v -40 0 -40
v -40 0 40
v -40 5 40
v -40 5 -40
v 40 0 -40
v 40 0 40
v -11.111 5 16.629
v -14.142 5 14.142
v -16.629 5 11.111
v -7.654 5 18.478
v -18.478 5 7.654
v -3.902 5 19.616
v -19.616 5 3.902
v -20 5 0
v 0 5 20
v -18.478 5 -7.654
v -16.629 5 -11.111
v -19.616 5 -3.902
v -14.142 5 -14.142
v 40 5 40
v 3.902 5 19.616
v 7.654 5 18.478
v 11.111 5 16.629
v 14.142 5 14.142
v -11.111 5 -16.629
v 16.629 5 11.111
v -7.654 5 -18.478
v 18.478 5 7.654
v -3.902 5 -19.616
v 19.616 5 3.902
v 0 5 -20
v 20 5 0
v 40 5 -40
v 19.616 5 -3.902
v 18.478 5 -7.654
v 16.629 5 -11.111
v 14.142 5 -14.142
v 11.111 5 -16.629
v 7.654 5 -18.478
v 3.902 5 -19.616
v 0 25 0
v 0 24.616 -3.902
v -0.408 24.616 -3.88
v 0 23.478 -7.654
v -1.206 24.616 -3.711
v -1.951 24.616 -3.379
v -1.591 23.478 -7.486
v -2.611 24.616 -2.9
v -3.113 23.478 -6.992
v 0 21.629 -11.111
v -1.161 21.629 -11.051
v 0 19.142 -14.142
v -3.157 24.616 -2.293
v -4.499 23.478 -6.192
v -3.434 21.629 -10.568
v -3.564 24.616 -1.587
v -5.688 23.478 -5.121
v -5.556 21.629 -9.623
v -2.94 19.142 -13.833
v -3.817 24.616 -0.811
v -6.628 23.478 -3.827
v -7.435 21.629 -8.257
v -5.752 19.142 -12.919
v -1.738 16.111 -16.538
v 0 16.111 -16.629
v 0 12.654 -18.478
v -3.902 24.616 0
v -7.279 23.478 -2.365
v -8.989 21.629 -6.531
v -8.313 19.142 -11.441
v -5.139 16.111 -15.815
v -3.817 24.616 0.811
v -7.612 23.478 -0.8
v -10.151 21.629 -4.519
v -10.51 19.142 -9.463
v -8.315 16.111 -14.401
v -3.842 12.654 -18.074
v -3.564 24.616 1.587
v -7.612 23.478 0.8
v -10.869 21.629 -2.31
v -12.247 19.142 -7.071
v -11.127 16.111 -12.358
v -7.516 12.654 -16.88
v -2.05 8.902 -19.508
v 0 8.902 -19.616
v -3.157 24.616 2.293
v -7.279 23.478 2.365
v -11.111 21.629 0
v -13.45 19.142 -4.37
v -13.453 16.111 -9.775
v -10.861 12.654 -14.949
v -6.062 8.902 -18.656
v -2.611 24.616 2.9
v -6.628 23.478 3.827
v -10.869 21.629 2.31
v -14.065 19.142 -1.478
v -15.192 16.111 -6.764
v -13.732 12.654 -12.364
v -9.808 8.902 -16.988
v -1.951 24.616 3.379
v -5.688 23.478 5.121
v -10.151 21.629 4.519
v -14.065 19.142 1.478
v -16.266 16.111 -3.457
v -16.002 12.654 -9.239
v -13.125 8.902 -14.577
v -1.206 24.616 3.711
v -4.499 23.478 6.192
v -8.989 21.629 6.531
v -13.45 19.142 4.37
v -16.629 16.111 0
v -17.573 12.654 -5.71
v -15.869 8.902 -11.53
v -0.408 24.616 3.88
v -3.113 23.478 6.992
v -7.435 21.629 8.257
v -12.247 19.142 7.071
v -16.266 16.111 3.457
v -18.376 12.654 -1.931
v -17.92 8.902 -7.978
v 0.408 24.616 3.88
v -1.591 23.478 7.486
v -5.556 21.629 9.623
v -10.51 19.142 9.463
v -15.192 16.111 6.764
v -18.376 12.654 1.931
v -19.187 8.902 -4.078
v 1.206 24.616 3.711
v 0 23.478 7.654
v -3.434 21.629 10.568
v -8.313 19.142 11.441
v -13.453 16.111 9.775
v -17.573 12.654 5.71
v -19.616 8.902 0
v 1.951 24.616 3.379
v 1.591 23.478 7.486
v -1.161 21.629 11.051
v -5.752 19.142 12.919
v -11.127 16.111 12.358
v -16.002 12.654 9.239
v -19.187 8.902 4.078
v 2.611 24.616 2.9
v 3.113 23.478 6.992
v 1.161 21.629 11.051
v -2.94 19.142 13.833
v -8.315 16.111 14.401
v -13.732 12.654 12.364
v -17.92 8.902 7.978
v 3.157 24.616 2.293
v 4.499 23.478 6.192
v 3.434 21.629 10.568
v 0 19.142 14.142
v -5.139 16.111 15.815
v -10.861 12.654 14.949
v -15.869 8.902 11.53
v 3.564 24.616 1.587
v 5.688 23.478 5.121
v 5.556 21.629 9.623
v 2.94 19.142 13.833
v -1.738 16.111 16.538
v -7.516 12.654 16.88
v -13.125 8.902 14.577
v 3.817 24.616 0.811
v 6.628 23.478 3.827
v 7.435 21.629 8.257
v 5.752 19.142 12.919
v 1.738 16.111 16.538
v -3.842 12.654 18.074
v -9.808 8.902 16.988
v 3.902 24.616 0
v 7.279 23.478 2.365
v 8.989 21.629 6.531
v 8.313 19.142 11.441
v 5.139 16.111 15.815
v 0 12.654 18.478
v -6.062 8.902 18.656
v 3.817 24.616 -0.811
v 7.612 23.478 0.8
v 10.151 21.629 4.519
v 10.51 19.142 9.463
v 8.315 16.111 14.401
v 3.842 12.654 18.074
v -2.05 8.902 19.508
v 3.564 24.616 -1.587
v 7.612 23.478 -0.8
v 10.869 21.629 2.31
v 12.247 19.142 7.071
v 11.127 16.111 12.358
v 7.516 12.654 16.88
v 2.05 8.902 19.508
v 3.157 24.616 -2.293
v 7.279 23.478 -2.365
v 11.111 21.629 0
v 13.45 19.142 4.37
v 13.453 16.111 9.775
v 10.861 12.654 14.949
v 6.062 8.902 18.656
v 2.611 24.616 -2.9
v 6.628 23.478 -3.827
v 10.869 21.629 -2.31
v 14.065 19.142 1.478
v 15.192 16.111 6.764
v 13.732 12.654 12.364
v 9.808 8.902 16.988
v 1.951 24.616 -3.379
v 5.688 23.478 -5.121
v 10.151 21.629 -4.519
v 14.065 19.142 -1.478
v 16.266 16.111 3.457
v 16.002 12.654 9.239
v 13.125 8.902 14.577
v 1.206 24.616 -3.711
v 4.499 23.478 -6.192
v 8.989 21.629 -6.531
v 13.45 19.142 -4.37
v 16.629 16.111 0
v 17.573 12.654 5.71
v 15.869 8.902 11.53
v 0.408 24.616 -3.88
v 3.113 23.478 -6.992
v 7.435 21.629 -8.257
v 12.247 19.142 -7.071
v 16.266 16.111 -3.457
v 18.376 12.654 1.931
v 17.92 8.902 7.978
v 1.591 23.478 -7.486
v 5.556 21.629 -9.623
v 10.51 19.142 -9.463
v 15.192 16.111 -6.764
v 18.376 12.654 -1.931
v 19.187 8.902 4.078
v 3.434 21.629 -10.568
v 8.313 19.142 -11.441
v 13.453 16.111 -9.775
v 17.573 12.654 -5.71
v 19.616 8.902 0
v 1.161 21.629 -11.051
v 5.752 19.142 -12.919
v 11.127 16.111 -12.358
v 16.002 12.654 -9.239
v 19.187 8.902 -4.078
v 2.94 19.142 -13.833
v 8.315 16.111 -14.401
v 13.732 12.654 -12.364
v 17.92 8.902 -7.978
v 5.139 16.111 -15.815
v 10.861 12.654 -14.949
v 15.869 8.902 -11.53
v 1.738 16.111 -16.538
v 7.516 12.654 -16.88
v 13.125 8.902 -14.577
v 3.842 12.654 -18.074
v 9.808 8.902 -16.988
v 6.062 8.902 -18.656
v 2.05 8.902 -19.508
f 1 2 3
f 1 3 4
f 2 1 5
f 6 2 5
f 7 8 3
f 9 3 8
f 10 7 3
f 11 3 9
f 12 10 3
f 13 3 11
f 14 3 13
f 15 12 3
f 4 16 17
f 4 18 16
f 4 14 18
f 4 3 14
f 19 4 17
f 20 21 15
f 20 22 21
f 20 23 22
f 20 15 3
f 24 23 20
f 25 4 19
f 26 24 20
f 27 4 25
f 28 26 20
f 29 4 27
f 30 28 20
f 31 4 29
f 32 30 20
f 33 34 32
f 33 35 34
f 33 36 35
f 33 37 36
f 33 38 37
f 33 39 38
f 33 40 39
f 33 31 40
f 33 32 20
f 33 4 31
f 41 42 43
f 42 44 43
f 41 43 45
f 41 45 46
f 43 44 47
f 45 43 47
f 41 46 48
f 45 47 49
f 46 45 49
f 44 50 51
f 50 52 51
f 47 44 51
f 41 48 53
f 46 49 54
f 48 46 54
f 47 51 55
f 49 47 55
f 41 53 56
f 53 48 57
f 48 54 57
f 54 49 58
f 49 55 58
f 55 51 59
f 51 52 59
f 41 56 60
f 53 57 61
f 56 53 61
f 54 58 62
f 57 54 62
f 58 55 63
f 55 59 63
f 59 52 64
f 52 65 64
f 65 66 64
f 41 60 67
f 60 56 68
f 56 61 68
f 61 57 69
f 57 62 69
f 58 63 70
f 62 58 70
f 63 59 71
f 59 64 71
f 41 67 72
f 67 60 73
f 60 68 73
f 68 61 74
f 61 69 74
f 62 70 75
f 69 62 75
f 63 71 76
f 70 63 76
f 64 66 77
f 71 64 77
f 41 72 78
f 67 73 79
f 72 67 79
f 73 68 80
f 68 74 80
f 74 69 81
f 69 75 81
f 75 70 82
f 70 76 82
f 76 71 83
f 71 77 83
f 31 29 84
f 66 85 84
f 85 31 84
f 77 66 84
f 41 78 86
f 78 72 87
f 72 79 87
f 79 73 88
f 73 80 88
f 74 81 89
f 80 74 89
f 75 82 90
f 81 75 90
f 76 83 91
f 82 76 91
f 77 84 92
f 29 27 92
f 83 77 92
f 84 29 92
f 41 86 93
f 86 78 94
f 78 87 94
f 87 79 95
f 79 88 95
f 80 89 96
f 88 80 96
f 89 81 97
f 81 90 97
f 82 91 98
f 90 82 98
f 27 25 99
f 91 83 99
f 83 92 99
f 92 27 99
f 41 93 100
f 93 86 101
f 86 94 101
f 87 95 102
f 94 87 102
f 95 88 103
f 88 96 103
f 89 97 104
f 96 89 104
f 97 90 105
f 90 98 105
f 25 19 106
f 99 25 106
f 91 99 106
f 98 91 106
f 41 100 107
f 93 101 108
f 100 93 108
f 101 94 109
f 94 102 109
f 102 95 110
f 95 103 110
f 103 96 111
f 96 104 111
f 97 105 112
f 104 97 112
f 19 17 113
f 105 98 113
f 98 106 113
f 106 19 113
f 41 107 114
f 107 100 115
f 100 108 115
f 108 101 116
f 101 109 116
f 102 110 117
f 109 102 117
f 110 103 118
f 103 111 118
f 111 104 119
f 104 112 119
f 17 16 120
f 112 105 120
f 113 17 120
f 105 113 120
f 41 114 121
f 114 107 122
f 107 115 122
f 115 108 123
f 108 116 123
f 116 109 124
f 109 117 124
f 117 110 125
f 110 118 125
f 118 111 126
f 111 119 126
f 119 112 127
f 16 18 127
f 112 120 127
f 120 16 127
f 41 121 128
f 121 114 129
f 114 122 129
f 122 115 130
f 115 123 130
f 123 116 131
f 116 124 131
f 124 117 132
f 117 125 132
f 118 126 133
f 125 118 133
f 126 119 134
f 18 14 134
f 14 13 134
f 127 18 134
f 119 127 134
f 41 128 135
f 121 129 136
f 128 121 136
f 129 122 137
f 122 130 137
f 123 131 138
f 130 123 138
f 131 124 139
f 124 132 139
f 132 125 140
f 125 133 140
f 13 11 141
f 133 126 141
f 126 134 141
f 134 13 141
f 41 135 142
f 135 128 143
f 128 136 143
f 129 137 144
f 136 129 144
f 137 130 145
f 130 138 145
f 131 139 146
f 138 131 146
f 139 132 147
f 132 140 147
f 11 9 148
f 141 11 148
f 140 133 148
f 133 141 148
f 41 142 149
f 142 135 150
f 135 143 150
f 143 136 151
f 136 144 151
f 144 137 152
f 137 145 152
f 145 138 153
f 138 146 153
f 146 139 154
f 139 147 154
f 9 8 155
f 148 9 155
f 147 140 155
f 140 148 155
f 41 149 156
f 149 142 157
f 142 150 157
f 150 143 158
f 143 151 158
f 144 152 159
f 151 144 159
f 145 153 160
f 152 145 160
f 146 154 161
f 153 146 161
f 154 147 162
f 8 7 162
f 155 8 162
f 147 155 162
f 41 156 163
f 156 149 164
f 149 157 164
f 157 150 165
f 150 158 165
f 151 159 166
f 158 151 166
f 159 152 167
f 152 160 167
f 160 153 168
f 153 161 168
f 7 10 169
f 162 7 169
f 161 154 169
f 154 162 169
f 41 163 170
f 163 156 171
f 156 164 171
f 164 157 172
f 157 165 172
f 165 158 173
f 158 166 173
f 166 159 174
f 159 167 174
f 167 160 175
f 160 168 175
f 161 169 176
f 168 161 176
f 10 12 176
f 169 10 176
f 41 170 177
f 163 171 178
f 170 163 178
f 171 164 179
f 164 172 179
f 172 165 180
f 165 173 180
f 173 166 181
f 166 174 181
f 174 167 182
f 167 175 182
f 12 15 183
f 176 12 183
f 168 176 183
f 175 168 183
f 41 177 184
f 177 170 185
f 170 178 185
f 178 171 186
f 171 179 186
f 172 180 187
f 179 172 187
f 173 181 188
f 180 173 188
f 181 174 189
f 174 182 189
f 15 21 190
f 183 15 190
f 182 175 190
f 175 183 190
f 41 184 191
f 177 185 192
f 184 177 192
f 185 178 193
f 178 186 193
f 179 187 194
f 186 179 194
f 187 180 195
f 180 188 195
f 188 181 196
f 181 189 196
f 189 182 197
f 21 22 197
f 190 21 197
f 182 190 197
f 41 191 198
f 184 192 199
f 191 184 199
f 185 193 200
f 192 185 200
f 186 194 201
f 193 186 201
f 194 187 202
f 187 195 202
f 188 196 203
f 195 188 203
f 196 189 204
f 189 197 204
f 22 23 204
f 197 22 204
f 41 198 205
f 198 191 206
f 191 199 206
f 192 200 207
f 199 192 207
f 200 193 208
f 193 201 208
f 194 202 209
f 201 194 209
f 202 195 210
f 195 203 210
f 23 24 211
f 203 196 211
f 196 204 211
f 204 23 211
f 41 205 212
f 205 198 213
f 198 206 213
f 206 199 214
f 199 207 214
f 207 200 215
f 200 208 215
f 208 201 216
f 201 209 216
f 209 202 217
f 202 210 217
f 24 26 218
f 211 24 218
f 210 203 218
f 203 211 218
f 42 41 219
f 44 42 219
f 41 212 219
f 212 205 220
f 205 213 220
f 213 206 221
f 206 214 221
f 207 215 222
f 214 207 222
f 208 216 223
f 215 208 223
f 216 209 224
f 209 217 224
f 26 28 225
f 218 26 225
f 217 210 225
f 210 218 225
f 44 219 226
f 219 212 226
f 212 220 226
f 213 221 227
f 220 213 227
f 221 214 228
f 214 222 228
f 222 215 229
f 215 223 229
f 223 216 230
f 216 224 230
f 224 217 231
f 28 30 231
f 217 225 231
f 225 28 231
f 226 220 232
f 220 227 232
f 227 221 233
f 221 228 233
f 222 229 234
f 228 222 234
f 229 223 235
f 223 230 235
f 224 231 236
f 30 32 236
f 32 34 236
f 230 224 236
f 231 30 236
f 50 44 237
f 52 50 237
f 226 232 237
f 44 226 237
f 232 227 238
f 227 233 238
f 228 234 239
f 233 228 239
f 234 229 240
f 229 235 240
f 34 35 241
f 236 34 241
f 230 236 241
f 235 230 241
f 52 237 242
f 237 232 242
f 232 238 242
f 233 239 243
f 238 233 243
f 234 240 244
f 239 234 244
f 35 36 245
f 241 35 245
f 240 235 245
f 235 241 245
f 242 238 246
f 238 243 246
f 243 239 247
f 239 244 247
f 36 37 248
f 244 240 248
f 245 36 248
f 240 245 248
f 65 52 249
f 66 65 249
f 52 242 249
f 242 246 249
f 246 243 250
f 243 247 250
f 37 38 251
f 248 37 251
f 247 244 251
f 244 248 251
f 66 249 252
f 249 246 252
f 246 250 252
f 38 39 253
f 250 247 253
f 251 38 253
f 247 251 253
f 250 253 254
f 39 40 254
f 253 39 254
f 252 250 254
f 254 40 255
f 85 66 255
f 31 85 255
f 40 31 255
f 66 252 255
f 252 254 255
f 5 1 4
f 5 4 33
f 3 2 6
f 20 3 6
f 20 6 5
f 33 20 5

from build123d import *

# Parameters (mm, degrees)
ESQUISSE1_W        = 80
ESQUISSE1_H        = 80
BOSS_EXTRU_1_DEPTH = 5


with BuildPart() as part:
    # Esquisse1 → Boss.-Extru.1 (new body)
    with BuildSketch(Plane(origin=(0, 0, 0), x_dir=(1, 0, 0), z_dir=(0, 1, 0))):
        Rectangle(ESQUISSE1_W, ESQUISSE1_H)
    extrude(amount=BOSS_EXTRU_1_DEPTH)

    # Esquisse2 → Révolution2 (revolve)
    with BuildSketch(Plane(origin=(0, 0, 0), x_dir=(0, 0, -1), z_dir=(1, 0, 0)), mode=Mode.PRIVATE) as r_volution2_sk:
        with BuildLine():
            Line((-20, 5), (0, 5))
            Line((0, 5), (0, 25))
            ThreePointArc((0, 25), (-14.142135624, 19.142135624), (-20, 5))
        make_face()
    revolve(r_volution2_sk.sketch.rotate(Axis((0, 5, 0), (0, 1, 0)), 180), axis=Axis((0, 5, 0), (0, 1, 0)))


solid = part.part
